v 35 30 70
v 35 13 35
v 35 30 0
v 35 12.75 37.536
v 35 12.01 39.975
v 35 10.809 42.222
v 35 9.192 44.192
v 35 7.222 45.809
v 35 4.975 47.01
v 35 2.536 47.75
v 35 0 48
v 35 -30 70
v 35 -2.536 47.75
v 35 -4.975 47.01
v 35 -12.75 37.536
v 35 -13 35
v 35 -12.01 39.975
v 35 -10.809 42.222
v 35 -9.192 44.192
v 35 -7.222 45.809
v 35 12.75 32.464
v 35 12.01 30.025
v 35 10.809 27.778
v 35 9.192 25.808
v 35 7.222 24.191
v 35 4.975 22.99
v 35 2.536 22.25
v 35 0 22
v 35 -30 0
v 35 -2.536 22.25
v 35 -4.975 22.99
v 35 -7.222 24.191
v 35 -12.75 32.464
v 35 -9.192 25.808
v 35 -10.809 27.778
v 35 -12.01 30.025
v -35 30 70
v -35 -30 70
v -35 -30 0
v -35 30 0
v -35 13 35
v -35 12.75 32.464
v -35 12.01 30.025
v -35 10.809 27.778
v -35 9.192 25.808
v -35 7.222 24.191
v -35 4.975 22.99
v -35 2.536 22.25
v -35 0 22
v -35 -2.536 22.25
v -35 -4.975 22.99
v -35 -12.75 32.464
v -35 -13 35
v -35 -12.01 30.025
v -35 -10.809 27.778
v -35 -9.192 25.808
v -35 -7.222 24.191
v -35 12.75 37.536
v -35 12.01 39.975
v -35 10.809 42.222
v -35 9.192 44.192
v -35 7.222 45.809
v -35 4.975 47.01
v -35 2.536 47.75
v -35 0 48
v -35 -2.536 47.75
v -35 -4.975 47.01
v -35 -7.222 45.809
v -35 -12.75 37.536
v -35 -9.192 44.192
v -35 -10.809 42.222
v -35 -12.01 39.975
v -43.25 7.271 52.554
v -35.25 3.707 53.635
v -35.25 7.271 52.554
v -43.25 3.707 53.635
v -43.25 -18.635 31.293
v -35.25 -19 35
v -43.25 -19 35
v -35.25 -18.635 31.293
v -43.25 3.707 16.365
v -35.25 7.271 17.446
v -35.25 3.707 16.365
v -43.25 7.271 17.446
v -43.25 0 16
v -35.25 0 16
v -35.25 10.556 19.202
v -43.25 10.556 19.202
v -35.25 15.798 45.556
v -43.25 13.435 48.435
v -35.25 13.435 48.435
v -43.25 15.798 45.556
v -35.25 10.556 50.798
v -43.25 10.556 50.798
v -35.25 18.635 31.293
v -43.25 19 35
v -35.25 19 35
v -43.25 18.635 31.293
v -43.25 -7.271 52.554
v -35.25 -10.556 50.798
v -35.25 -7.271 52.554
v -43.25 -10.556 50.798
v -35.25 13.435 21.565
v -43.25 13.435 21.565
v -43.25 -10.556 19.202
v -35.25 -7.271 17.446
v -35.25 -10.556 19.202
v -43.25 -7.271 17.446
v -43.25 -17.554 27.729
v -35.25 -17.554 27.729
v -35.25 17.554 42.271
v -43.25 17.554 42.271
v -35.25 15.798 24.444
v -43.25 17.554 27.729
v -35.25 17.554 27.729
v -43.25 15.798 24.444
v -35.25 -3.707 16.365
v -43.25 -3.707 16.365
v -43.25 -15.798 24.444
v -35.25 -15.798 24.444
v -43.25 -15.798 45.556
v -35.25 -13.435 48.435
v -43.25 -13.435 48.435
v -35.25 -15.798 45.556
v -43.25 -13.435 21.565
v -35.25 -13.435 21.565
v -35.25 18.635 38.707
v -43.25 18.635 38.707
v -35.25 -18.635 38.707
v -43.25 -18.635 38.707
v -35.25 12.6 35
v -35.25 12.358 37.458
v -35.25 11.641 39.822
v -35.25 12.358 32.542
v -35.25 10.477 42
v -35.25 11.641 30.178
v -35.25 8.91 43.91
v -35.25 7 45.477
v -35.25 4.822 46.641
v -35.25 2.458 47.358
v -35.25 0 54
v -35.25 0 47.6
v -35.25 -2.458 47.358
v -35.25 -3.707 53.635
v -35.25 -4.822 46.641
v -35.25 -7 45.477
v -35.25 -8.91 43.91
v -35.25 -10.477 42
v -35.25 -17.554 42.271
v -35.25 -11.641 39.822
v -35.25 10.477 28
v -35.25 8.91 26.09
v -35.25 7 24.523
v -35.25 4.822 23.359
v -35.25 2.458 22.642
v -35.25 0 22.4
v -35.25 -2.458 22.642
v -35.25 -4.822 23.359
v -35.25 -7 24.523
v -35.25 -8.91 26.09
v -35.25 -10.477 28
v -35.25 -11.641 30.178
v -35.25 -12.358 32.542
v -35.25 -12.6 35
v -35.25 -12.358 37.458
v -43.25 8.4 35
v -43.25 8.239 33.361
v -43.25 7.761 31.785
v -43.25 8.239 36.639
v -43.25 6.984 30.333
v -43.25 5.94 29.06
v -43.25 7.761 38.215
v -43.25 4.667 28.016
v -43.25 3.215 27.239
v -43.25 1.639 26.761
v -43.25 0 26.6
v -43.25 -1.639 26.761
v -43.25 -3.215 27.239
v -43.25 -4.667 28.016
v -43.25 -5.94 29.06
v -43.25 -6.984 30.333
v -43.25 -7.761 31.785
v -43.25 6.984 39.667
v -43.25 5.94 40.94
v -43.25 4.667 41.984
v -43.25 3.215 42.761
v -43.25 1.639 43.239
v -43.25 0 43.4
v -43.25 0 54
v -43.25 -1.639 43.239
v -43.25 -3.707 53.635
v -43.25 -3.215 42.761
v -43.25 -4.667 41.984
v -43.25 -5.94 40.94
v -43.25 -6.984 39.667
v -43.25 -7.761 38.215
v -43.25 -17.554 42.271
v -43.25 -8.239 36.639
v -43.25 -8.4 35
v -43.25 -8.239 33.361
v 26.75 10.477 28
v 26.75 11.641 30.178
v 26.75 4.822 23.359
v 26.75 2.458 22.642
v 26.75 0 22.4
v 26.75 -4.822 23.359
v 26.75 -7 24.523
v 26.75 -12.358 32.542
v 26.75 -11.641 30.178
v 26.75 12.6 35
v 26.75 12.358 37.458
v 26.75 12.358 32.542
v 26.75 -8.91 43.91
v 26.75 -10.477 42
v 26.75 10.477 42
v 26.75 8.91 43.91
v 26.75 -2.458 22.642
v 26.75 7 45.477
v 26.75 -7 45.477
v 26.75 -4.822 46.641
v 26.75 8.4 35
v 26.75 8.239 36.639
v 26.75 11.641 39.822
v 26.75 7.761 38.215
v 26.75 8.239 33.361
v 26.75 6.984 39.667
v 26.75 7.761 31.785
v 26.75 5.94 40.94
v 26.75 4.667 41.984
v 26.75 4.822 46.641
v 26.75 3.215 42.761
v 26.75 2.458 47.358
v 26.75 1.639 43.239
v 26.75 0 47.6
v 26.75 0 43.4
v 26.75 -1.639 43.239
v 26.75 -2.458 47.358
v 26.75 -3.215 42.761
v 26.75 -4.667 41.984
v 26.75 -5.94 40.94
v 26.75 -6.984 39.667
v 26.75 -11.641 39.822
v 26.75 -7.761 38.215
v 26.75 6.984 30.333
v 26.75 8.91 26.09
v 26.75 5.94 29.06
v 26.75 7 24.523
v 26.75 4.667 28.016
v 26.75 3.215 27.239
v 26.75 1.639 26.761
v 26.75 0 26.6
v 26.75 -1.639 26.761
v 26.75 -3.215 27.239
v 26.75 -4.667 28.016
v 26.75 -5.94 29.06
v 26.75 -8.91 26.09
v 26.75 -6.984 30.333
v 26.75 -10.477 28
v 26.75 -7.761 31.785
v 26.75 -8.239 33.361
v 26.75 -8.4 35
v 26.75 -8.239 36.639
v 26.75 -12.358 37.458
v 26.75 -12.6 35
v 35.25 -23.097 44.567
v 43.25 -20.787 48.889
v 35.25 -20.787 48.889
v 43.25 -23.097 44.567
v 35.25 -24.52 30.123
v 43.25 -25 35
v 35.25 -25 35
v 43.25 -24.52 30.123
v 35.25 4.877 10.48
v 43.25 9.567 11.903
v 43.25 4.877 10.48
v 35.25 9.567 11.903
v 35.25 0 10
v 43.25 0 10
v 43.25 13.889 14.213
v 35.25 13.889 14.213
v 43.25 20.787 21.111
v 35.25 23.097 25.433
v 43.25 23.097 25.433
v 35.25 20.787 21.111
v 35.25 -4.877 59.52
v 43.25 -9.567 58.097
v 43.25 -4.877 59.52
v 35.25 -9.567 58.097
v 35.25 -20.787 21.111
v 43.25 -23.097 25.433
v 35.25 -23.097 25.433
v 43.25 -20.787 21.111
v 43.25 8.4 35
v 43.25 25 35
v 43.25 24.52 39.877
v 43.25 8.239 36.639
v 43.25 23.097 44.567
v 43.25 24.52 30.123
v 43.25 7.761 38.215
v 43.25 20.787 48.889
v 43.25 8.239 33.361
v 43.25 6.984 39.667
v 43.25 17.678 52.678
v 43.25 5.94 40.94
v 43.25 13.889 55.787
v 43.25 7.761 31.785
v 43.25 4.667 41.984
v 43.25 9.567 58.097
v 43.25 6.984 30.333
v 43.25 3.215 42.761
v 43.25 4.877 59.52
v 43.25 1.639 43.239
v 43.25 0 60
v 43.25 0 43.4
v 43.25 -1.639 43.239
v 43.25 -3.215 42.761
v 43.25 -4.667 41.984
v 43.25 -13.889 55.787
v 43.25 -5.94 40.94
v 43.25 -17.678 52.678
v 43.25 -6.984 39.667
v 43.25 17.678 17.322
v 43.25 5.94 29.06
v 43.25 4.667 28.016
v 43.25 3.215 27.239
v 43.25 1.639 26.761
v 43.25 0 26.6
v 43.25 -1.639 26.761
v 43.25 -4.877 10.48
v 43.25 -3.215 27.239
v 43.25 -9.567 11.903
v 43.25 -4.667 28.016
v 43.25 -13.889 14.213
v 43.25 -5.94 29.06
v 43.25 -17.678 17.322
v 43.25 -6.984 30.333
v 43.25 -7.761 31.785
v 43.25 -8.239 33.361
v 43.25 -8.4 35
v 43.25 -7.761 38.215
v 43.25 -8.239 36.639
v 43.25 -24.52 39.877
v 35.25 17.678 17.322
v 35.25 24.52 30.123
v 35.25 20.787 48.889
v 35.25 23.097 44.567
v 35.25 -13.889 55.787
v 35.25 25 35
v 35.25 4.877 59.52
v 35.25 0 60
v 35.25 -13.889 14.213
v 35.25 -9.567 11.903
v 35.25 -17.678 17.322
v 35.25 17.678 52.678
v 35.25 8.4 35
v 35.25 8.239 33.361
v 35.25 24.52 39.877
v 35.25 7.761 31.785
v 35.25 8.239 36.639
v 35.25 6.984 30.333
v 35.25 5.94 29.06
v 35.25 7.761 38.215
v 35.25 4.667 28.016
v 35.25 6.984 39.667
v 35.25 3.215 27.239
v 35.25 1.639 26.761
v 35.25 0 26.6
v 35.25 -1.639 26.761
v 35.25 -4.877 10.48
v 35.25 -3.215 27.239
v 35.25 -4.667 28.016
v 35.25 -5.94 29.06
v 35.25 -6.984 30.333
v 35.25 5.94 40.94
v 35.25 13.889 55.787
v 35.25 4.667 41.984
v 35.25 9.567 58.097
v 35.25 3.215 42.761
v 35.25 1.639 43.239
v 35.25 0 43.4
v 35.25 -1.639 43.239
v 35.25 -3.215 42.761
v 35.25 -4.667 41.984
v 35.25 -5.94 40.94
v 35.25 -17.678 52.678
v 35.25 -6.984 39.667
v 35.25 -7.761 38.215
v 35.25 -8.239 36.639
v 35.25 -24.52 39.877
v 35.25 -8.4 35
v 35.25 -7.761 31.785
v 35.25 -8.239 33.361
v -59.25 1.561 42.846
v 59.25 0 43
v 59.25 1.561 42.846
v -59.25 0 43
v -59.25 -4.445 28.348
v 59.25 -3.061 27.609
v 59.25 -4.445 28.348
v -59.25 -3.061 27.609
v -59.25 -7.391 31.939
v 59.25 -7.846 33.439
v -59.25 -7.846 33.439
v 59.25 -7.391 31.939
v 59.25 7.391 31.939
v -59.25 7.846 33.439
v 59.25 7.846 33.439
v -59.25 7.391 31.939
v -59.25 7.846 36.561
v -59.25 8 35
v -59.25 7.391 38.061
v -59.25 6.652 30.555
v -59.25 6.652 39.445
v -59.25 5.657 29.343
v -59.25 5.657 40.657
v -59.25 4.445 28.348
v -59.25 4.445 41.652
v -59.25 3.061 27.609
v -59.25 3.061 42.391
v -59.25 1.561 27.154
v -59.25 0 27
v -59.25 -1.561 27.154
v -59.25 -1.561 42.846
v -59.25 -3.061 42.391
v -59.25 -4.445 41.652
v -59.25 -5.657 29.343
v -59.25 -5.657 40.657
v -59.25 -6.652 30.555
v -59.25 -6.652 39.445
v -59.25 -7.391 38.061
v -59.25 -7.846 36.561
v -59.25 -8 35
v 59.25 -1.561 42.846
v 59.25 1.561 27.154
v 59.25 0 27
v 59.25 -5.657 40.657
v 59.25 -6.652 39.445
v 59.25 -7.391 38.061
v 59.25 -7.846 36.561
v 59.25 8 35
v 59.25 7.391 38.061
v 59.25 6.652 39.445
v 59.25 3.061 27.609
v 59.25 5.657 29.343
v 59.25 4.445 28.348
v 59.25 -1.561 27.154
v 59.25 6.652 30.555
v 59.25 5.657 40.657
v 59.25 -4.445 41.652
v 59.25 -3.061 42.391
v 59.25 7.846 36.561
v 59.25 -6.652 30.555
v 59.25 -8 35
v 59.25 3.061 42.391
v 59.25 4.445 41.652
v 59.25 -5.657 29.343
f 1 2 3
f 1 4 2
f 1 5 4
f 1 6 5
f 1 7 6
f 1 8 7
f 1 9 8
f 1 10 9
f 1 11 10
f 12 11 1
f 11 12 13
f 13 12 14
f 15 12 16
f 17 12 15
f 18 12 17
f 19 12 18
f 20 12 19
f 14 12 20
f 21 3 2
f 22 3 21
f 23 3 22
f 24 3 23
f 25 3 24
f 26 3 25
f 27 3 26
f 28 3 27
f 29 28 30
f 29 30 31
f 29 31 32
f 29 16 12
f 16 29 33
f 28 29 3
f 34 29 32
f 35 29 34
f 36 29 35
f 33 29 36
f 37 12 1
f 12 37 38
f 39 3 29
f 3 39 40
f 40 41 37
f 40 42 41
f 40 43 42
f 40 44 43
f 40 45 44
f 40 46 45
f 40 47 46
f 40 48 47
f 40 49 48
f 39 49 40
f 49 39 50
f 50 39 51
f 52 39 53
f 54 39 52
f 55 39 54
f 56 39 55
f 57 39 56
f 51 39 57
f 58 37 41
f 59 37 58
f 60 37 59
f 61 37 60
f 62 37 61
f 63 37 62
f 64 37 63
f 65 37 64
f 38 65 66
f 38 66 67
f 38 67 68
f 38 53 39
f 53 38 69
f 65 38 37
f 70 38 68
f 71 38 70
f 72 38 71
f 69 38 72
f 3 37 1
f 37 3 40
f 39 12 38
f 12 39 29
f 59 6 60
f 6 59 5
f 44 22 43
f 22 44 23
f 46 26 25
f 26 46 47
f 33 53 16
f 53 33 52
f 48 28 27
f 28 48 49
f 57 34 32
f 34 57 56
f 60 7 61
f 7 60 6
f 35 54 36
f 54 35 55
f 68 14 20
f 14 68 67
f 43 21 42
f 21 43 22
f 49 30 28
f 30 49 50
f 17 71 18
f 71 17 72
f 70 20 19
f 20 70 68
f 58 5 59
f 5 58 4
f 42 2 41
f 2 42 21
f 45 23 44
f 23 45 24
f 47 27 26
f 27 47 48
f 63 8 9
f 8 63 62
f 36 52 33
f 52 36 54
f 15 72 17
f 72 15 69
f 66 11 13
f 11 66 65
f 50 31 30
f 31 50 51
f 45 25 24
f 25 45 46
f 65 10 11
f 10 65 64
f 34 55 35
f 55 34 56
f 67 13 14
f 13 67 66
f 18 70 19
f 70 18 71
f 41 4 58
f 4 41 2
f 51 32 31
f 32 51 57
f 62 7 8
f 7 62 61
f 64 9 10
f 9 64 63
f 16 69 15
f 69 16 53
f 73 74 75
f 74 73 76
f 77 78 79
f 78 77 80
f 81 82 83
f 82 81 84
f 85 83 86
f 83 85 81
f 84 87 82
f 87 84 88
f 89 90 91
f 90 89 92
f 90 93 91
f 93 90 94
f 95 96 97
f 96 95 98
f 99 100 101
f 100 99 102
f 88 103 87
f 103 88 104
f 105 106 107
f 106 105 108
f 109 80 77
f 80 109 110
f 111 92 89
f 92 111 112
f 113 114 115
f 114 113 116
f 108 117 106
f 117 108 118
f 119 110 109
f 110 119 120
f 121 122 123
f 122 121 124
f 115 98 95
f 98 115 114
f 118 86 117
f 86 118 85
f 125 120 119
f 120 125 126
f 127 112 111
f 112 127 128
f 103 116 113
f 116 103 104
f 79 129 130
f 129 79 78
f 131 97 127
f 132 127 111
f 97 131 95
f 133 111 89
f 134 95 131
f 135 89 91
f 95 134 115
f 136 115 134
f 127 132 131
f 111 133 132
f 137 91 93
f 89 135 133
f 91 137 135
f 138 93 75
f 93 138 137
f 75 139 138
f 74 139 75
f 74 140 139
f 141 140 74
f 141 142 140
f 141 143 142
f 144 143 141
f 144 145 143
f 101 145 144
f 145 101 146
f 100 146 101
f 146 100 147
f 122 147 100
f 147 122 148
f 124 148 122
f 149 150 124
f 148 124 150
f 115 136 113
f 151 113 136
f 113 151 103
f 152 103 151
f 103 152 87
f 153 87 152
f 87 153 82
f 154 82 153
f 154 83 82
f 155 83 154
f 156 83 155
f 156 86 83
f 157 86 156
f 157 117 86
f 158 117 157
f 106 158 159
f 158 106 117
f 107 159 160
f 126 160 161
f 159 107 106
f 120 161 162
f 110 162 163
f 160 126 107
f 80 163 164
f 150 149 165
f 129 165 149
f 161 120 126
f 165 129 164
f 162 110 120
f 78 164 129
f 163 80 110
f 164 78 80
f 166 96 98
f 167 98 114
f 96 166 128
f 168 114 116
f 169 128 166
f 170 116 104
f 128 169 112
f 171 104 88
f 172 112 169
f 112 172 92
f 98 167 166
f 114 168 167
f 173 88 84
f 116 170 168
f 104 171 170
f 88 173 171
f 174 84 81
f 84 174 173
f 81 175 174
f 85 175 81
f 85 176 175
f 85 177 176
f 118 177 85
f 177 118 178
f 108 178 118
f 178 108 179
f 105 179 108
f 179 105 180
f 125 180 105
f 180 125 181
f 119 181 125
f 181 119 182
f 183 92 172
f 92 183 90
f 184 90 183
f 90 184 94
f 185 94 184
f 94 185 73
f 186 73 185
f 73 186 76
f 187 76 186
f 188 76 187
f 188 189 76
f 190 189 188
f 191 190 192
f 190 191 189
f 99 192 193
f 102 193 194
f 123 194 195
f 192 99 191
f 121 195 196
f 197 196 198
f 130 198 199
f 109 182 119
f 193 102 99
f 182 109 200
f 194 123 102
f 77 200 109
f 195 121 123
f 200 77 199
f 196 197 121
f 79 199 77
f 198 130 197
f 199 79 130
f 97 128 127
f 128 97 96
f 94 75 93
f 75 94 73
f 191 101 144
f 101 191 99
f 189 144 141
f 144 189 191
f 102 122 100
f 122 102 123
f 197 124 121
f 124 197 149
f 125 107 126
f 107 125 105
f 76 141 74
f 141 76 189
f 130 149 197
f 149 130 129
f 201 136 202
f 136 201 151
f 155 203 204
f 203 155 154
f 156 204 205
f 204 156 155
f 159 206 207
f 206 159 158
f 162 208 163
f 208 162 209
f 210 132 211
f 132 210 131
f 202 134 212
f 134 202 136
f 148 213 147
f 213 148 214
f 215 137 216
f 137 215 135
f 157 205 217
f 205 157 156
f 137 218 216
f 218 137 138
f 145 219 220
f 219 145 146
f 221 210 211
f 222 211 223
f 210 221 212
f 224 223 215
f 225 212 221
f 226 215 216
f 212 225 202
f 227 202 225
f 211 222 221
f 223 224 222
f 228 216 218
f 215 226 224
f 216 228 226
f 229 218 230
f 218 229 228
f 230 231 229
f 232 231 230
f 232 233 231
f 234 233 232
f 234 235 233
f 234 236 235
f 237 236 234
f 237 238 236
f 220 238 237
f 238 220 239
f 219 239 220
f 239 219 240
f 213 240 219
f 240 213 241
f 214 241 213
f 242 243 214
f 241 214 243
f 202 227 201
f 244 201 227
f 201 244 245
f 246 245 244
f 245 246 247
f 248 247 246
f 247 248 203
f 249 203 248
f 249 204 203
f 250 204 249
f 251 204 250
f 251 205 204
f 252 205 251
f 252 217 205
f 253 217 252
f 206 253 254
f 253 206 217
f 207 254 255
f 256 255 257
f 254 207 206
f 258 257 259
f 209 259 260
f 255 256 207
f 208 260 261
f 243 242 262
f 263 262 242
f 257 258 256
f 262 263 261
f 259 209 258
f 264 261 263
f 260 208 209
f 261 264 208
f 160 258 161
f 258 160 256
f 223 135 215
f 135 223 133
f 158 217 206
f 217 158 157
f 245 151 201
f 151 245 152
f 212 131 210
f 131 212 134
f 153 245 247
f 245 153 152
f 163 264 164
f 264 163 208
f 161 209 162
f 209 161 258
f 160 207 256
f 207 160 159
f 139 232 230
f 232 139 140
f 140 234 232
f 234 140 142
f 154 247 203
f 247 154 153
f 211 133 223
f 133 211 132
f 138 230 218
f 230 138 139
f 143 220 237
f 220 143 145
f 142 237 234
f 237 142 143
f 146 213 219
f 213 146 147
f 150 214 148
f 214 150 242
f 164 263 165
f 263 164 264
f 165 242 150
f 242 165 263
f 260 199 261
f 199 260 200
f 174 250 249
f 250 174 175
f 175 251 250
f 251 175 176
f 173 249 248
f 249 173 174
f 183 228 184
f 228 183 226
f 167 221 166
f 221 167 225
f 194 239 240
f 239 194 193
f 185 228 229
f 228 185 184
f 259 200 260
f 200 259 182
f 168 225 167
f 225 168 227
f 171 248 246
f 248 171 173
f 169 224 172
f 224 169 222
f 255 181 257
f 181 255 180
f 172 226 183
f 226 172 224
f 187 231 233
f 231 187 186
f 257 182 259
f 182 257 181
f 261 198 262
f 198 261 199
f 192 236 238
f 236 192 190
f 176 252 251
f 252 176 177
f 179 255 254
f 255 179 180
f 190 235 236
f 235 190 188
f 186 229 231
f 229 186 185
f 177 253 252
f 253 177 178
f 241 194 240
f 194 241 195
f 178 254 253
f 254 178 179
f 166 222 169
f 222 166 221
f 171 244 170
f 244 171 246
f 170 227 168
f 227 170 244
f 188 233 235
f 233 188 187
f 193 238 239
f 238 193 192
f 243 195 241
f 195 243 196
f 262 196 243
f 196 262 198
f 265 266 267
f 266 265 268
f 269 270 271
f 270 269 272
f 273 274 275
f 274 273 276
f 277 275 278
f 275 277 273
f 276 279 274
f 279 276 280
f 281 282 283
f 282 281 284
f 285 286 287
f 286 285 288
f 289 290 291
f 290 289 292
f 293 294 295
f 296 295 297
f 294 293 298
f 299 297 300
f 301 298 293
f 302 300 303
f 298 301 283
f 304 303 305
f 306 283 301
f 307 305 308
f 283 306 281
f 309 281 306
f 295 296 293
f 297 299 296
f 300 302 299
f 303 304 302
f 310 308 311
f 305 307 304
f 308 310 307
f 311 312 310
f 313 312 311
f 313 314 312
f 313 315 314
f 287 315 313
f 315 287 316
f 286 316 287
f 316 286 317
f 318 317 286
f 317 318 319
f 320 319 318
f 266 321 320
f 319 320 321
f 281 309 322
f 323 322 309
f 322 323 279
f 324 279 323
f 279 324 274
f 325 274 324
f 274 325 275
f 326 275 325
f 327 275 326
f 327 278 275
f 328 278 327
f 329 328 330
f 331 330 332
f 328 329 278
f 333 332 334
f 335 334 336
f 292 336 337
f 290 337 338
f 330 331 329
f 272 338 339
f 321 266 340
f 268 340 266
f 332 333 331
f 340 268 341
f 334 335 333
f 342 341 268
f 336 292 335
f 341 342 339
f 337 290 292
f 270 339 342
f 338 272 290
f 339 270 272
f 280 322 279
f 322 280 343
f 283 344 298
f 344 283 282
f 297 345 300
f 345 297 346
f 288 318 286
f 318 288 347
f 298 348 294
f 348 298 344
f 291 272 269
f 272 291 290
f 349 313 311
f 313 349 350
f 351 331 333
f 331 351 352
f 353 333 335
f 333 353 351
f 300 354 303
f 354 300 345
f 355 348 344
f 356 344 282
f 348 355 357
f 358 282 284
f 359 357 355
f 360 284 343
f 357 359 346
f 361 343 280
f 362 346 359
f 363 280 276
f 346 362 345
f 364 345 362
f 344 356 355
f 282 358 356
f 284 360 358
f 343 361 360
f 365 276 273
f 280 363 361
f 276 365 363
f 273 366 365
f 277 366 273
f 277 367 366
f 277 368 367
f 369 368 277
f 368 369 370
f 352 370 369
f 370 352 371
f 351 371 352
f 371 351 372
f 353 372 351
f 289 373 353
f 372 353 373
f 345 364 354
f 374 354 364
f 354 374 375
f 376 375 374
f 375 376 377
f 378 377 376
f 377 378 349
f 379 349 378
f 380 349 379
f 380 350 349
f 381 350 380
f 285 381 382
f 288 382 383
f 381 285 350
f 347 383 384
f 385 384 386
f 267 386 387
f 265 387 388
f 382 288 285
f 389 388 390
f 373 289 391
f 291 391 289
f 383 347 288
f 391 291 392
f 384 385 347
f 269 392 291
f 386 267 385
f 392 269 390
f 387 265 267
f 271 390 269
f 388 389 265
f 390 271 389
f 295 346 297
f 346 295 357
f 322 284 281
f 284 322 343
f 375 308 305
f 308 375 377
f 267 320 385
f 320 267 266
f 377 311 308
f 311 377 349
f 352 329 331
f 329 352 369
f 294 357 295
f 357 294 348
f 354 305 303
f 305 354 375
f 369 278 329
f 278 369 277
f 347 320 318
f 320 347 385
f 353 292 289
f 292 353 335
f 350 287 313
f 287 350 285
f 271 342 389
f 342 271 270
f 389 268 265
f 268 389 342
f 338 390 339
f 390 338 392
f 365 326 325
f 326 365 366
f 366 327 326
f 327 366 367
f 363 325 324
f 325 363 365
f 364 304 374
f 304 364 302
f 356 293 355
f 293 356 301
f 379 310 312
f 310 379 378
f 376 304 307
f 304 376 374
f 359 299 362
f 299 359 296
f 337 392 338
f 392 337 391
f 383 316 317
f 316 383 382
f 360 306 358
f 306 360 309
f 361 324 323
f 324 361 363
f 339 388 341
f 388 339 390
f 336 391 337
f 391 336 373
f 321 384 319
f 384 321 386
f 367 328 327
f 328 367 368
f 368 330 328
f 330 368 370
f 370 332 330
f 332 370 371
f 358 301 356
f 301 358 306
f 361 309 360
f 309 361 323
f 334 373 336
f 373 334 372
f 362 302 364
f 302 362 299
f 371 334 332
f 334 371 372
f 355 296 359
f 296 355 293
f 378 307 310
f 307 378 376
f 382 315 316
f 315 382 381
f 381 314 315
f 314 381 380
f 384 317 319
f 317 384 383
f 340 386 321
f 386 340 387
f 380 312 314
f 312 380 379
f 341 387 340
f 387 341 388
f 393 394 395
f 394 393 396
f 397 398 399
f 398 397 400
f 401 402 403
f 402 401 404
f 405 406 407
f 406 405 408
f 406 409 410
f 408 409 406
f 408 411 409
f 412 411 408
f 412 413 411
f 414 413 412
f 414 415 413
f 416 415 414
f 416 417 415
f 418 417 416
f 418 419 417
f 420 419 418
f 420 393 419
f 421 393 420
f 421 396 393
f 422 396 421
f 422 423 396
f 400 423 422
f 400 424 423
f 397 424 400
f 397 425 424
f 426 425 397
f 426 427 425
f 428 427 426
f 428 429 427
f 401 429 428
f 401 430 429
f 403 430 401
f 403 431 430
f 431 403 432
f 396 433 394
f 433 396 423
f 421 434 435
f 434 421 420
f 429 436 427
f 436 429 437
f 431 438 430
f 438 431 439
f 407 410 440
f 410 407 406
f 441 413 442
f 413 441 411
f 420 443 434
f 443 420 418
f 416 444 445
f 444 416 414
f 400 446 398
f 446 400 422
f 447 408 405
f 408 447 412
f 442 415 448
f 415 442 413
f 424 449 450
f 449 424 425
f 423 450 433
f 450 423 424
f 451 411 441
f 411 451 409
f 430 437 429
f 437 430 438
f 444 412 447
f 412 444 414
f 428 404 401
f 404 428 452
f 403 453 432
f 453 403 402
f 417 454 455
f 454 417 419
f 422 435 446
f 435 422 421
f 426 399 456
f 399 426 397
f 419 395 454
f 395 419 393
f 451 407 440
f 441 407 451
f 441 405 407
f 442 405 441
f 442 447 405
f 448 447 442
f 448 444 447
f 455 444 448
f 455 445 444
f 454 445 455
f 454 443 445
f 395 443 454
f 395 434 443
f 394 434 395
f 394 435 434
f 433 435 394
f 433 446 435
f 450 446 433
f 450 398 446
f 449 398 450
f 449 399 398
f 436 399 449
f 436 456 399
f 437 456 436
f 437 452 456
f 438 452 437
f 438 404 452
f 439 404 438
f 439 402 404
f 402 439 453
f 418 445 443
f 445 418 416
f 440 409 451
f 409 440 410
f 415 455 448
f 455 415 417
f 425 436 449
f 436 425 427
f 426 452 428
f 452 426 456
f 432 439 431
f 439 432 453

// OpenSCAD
$fn = 32;

// ------------------------------------------------------------------------
// Bushed housing: 70 x 60 x 70 mm housing, bushing d25.2
// Every part is its own module, assembly() places them once.
// ------------------------------------------------------------------------

// --- part 1 ---
module housing() {
  difference() {
    translate([-35, -30, 0]) cube([70, 60, 70]);
    translate([0, 0, 35]) rotate([0, 90, 0]) cylinder(h = 72, d = 26, center = true);
  }
}

// --- part 2 ---
module bushing() {
  difference() {
    union() {
      cylinder(h = 8, d = 38);
      translate([0, 0, 8]) cylinder(h = 62, d = 25.2);
    }
    translate([0, 0, -1]) cylinder(h = 72, d = 16.8);
  }
}

// --- part 3 ---
module shaft() {
  translate([0, 0, -59.25]) cylinder(h = 118.5, d = 16);
}

// --- part 4 ---
module cover() {
  difference() {
    cylinder(h = 8, d = 50);
    translate([0, 0, -1]) cylinder(h = 10, d = 16.8);
  }
}

// --- assembly ---
module assembly() {
  translate([0, 0, 0]) rotate([0, 0, 0]) housing();
  translate([-43.25, 0, 35]) rotate([0, 90, 0]) bushing();
  translate([0, 0, 35]) rotate([0, 90, 0]) shaft();
  translate([35.25, 0, 35]) rotate([0, 90, 0]) cover();
}

assembly();
